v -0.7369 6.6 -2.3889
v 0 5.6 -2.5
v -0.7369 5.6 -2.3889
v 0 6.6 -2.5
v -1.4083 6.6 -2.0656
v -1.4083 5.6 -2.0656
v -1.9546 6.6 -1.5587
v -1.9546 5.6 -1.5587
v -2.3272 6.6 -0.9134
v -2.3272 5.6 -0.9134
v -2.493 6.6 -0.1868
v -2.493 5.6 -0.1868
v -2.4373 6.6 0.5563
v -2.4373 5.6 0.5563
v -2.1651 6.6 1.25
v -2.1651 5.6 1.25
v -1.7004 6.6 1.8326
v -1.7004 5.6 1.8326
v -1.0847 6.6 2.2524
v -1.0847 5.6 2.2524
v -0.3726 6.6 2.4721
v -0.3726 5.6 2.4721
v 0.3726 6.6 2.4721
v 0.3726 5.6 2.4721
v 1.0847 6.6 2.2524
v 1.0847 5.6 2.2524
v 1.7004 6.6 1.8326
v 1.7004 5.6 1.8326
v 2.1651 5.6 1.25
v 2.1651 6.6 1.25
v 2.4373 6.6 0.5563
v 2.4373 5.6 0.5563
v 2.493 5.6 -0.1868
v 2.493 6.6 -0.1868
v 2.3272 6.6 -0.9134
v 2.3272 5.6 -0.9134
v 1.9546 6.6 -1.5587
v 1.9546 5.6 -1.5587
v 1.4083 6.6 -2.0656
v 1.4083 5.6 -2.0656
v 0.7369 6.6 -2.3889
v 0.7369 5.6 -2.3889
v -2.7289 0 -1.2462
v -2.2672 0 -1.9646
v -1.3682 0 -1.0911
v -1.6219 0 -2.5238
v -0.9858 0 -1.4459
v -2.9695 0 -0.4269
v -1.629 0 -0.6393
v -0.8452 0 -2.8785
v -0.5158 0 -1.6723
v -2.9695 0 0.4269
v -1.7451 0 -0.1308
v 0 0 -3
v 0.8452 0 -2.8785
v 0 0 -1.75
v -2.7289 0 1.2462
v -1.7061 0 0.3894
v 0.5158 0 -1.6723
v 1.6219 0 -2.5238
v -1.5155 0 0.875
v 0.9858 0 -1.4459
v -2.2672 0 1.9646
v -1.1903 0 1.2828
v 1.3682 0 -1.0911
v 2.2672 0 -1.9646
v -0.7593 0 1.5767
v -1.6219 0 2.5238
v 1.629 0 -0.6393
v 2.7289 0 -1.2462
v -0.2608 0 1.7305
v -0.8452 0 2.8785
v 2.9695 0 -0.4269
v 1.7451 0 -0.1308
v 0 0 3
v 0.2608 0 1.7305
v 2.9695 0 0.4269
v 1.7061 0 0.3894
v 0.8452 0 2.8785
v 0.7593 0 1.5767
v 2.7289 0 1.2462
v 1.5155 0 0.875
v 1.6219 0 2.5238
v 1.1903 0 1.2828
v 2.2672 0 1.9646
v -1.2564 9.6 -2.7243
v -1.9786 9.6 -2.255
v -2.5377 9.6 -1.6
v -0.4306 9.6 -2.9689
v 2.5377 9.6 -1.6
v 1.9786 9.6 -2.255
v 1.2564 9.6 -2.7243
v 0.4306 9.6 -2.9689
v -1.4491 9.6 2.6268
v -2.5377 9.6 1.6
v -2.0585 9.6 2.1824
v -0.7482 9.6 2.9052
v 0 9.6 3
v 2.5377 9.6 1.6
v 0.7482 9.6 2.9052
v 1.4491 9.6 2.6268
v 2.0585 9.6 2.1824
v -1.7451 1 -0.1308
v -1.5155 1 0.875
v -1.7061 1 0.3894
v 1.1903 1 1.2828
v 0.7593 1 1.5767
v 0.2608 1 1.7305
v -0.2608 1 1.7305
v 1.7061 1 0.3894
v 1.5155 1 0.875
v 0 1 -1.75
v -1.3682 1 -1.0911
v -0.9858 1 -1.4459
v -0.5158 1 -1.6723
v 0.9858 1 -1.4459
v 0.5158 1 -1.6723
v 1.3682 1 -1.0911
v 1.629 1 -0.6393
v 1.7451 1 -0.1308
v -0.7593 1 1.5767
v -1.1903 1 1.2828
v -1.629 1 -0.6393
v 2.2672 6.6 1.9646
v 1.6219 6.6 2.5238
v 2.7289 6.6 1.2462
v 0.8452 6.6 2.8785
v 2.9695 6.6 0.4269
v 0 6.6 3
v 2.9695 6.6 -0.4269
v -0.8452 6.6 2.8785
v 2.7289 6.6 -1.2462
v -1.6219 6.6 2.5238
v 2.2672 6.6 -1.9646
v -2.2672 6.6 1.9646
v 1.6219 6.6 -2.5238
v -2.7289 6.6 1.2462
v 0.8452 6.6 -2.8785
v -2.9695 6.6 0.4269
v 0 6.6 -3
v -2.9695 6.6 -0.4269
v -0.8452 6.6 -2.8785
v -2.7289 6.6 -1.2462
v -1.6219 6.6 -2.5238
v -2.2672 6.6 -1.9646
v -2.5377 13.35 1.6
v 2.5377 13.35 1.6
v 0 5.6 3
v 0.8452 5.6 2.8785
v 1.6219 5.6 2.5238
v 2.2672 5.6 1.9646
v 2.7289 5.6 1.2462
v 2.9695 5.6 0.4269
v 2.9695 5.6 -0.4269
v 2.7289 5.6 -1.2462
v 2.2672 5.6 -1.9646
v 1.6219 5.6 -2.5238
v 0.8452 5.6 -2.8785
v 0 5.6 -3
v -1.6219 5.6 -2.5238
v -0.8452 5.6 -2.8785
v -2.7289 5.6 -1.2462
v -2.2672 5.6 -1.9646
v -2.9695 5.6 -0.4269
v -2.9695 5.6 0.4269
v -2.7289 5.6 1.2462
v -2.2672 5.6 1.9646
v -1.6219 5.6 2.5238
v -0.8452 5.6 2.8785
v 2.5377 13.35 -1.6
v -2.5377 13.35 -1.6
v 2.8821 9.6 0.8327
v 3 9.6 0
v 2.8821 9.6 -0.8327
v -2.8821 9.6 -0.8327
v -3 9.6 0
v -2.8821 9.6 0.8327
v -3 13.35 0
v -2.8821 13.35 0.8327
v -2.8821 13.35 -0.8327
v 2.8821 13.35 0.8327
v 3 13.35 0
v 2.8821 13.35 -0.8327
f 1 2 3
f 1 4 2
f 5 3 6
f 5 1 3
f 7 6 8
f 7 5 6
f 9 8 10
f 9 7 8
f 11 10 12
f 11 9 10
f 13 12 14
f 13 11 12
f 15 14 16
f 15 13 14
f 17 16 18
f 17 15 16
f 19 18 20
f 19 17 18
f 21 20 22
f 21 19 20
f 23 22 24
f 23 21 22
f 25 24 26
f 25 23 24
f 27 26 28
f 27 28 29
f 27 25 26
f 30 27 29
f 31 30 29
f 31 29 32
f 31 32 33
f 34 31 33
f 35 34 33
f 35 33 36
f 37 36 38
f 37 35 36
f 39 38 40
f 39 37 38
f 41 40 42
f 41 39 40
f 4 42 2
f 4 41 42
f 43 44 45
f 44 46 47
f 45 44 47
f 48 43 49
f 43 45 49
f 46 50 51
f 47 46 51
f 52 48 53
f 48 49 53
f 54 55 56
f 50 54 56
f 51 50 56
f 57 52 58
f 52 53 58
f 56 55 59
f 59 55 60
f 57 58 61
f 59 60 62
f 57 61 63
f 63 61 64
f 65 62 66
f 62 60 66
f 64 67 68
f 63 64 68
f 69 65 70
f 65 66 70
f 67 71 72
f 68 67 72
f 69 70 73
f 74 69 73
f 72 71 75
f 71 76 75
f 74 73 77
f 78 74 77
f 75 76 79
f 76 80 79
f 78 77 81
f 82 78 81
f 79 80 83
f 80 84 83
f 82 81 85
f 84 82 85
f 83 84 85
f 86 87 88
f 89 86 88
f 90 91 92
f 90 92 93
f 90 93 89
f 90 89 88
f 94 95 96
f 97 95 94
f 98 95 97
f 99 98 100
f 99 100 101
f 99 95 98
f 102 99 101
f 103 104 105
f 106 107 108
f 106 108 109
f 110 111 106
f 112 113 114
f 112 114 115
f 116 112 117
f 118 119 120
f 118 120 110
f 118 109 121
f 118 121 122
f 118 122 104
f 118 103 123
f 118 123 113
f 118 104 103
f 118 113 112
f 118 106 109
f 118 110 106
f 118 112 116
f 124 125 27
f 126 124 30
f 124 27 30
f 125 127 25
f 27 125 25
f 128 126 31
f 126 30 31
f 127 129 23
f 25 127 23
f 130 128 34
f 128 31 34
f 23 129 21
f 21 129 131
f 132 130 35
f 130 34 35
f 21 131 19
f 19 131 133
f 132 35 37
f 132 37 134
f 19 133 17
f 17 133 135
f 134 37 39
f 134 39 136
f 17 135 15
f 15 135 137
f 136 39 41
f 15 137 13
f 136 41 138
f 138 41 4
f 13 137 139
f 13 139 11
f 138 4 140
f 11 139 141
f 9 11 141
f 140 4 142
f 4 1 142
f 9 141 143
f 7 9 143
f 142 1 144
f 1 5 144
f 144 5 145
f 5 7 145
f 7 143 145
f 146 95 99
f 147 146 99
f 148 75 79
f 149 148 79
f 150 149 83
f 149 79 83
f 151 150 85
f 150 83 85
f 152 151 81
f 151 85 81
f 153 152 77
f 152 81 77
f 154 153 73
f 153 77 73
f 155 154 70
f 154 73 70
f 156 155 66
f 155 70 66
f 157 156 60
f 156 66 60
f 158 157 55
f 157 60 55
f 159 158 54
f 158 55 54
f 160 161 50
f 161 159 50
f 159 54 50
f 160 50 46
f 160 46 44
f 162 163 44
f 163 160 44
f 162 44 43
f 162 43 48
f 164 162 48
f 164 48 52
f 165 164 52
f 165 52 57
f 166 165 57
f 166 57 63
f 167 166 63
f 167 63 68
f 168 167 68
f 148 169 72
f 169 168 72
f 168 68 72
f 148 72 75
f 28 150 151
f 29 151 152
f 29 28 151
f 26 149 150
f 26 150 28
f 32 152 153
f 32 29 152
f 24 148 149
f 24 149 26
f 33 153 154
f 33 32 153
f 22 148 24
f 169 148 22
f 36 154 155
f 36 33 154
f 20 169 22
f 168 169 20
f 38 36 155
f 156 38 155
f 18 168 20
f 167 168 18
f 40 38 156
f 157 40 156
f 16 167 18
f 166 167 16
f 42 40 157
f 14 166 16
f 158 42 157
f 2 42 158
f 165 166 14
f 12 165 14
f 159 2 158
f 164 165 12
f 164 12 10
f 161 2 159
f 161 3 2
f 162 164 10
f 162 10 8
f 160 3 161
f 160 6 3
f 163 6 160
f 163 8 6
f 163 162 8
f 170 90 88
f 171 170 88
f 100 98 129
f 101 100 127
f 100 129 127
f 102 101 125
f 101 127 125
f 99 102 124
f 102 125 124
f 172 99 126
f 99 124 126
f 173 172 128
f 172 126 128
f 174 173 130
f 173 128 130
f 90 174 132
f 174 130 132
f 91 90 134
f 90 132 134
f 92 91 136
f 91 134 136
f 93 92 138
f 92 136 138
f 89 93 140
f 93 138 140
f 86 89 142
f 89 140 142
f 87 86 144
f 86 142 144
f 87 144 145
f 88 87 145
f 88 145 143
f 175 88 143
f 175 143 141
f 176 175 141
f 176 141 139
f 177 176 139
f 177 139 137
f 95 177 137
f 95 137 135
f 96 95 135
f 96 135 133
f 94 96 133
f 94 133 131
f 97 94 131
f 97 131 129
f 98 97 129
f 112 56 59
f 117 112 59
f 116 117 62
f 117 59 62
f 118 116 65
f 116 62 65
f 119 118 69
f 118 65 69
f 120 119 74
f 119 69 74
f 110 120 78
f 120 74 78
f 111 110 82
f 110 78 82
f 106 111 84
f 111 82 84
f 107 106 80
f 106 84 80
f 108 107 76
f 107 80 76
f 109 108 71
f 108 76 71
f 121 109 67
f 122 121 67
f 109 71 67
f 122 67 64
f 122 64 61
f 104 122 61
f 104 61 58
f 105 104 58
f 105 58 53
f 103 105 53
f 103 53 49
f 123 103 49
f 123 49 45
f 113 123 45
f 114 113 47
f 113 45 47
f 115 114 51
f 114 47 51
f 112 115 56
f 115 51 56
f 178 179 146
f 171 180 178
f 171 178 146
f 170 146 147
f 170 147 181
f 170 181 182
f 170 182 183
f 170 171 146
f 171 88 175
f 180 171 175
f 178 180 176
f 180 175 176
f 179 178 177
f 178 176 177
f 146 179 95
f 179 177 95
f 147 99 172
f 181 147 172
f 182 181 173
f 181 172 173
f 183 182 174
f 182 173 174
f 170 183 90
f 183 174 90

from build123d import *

# Parameters (mm, degrees)
SKETCH1_R           = 3
BOSS_EXTRUDE1_DEPTH = 9.6
SKETCH2_R           = 1.75
CUT_EXTRUDE1_DEPTH  = 1
BOSS_EXTRUDE2_DEPTH = 3.75
SKETCH4_W           = 0.5
SKETCH4_H           = 1


with BuildPart() as part:
    # Sketch1 → Boss-Extrude1 (new body)
    with BuildSketch(Plane(origin=(0, 0, 0), x_dir=(1, 0, 0), z_dir=(0, 1, 0))):
        with Locations(Location((0, 0, 0), (0, 0, 270))):
            Circle(SKETCH1_R)
    extrude(amount=BOSS_EXTRUDE1_DEPTH)

    # Sketch2 → Cut-Extrude1 (cut)
    with BuildSketch(Plane.XZ):
        with Locations(Location((0, 0, 0), (0, 0, 270))):
            Circle(SKETCH2_R)
    extrude(amount=-CUT_EXTRUDE1_DEPTH, mode=Mode.SUBTRACT)

    # Sketch3 → Boss-Extrude2 (add)
    with BuildSketch(Plane(origin=(0, 9.6, 0), x_dir=(1, 0, 0), z_dir=(0, 1, 0))):
        with BuildLine():
            Line((-2.537715508, -1.6), (2.537715508, -1.6))
            ThreePointArc((2.537715508, -1.6), (3, 0), (2.537715508, 1.6))
            Line((2.537715508, 1.6), (-2.537715508, 1.6))
            ThreePointArc((-2.537715508, 1.6), (-3, 0), (-2.537715508, -1.6))
        make_face()
    extrude(amount=BOSS_EXTRUDE2_DEPTH)

    # Sketch4 → Cut-Revolve2 (revolve, cut)
    with BuildSketch(Plane(origin=(0, 0, 0), x_dir=(0, 0, -1), z_dir=(1, 0, 0)), mode=Mode.PRIVATE) as cut_revolve2_sk:
        with Locations((-2.75, 6.1)):
            Rectangle(SKETCH4_W, SKETCH4_H)
    revolve(cut_revolve2_sk.sketch.rotate(Axis((0, 0, 0), (0, 1, 0)), 180), axis=Axis((0, 0, 0), (0, 1, 0)), mode=Mode.SUBTRACT)


solid = part.part
